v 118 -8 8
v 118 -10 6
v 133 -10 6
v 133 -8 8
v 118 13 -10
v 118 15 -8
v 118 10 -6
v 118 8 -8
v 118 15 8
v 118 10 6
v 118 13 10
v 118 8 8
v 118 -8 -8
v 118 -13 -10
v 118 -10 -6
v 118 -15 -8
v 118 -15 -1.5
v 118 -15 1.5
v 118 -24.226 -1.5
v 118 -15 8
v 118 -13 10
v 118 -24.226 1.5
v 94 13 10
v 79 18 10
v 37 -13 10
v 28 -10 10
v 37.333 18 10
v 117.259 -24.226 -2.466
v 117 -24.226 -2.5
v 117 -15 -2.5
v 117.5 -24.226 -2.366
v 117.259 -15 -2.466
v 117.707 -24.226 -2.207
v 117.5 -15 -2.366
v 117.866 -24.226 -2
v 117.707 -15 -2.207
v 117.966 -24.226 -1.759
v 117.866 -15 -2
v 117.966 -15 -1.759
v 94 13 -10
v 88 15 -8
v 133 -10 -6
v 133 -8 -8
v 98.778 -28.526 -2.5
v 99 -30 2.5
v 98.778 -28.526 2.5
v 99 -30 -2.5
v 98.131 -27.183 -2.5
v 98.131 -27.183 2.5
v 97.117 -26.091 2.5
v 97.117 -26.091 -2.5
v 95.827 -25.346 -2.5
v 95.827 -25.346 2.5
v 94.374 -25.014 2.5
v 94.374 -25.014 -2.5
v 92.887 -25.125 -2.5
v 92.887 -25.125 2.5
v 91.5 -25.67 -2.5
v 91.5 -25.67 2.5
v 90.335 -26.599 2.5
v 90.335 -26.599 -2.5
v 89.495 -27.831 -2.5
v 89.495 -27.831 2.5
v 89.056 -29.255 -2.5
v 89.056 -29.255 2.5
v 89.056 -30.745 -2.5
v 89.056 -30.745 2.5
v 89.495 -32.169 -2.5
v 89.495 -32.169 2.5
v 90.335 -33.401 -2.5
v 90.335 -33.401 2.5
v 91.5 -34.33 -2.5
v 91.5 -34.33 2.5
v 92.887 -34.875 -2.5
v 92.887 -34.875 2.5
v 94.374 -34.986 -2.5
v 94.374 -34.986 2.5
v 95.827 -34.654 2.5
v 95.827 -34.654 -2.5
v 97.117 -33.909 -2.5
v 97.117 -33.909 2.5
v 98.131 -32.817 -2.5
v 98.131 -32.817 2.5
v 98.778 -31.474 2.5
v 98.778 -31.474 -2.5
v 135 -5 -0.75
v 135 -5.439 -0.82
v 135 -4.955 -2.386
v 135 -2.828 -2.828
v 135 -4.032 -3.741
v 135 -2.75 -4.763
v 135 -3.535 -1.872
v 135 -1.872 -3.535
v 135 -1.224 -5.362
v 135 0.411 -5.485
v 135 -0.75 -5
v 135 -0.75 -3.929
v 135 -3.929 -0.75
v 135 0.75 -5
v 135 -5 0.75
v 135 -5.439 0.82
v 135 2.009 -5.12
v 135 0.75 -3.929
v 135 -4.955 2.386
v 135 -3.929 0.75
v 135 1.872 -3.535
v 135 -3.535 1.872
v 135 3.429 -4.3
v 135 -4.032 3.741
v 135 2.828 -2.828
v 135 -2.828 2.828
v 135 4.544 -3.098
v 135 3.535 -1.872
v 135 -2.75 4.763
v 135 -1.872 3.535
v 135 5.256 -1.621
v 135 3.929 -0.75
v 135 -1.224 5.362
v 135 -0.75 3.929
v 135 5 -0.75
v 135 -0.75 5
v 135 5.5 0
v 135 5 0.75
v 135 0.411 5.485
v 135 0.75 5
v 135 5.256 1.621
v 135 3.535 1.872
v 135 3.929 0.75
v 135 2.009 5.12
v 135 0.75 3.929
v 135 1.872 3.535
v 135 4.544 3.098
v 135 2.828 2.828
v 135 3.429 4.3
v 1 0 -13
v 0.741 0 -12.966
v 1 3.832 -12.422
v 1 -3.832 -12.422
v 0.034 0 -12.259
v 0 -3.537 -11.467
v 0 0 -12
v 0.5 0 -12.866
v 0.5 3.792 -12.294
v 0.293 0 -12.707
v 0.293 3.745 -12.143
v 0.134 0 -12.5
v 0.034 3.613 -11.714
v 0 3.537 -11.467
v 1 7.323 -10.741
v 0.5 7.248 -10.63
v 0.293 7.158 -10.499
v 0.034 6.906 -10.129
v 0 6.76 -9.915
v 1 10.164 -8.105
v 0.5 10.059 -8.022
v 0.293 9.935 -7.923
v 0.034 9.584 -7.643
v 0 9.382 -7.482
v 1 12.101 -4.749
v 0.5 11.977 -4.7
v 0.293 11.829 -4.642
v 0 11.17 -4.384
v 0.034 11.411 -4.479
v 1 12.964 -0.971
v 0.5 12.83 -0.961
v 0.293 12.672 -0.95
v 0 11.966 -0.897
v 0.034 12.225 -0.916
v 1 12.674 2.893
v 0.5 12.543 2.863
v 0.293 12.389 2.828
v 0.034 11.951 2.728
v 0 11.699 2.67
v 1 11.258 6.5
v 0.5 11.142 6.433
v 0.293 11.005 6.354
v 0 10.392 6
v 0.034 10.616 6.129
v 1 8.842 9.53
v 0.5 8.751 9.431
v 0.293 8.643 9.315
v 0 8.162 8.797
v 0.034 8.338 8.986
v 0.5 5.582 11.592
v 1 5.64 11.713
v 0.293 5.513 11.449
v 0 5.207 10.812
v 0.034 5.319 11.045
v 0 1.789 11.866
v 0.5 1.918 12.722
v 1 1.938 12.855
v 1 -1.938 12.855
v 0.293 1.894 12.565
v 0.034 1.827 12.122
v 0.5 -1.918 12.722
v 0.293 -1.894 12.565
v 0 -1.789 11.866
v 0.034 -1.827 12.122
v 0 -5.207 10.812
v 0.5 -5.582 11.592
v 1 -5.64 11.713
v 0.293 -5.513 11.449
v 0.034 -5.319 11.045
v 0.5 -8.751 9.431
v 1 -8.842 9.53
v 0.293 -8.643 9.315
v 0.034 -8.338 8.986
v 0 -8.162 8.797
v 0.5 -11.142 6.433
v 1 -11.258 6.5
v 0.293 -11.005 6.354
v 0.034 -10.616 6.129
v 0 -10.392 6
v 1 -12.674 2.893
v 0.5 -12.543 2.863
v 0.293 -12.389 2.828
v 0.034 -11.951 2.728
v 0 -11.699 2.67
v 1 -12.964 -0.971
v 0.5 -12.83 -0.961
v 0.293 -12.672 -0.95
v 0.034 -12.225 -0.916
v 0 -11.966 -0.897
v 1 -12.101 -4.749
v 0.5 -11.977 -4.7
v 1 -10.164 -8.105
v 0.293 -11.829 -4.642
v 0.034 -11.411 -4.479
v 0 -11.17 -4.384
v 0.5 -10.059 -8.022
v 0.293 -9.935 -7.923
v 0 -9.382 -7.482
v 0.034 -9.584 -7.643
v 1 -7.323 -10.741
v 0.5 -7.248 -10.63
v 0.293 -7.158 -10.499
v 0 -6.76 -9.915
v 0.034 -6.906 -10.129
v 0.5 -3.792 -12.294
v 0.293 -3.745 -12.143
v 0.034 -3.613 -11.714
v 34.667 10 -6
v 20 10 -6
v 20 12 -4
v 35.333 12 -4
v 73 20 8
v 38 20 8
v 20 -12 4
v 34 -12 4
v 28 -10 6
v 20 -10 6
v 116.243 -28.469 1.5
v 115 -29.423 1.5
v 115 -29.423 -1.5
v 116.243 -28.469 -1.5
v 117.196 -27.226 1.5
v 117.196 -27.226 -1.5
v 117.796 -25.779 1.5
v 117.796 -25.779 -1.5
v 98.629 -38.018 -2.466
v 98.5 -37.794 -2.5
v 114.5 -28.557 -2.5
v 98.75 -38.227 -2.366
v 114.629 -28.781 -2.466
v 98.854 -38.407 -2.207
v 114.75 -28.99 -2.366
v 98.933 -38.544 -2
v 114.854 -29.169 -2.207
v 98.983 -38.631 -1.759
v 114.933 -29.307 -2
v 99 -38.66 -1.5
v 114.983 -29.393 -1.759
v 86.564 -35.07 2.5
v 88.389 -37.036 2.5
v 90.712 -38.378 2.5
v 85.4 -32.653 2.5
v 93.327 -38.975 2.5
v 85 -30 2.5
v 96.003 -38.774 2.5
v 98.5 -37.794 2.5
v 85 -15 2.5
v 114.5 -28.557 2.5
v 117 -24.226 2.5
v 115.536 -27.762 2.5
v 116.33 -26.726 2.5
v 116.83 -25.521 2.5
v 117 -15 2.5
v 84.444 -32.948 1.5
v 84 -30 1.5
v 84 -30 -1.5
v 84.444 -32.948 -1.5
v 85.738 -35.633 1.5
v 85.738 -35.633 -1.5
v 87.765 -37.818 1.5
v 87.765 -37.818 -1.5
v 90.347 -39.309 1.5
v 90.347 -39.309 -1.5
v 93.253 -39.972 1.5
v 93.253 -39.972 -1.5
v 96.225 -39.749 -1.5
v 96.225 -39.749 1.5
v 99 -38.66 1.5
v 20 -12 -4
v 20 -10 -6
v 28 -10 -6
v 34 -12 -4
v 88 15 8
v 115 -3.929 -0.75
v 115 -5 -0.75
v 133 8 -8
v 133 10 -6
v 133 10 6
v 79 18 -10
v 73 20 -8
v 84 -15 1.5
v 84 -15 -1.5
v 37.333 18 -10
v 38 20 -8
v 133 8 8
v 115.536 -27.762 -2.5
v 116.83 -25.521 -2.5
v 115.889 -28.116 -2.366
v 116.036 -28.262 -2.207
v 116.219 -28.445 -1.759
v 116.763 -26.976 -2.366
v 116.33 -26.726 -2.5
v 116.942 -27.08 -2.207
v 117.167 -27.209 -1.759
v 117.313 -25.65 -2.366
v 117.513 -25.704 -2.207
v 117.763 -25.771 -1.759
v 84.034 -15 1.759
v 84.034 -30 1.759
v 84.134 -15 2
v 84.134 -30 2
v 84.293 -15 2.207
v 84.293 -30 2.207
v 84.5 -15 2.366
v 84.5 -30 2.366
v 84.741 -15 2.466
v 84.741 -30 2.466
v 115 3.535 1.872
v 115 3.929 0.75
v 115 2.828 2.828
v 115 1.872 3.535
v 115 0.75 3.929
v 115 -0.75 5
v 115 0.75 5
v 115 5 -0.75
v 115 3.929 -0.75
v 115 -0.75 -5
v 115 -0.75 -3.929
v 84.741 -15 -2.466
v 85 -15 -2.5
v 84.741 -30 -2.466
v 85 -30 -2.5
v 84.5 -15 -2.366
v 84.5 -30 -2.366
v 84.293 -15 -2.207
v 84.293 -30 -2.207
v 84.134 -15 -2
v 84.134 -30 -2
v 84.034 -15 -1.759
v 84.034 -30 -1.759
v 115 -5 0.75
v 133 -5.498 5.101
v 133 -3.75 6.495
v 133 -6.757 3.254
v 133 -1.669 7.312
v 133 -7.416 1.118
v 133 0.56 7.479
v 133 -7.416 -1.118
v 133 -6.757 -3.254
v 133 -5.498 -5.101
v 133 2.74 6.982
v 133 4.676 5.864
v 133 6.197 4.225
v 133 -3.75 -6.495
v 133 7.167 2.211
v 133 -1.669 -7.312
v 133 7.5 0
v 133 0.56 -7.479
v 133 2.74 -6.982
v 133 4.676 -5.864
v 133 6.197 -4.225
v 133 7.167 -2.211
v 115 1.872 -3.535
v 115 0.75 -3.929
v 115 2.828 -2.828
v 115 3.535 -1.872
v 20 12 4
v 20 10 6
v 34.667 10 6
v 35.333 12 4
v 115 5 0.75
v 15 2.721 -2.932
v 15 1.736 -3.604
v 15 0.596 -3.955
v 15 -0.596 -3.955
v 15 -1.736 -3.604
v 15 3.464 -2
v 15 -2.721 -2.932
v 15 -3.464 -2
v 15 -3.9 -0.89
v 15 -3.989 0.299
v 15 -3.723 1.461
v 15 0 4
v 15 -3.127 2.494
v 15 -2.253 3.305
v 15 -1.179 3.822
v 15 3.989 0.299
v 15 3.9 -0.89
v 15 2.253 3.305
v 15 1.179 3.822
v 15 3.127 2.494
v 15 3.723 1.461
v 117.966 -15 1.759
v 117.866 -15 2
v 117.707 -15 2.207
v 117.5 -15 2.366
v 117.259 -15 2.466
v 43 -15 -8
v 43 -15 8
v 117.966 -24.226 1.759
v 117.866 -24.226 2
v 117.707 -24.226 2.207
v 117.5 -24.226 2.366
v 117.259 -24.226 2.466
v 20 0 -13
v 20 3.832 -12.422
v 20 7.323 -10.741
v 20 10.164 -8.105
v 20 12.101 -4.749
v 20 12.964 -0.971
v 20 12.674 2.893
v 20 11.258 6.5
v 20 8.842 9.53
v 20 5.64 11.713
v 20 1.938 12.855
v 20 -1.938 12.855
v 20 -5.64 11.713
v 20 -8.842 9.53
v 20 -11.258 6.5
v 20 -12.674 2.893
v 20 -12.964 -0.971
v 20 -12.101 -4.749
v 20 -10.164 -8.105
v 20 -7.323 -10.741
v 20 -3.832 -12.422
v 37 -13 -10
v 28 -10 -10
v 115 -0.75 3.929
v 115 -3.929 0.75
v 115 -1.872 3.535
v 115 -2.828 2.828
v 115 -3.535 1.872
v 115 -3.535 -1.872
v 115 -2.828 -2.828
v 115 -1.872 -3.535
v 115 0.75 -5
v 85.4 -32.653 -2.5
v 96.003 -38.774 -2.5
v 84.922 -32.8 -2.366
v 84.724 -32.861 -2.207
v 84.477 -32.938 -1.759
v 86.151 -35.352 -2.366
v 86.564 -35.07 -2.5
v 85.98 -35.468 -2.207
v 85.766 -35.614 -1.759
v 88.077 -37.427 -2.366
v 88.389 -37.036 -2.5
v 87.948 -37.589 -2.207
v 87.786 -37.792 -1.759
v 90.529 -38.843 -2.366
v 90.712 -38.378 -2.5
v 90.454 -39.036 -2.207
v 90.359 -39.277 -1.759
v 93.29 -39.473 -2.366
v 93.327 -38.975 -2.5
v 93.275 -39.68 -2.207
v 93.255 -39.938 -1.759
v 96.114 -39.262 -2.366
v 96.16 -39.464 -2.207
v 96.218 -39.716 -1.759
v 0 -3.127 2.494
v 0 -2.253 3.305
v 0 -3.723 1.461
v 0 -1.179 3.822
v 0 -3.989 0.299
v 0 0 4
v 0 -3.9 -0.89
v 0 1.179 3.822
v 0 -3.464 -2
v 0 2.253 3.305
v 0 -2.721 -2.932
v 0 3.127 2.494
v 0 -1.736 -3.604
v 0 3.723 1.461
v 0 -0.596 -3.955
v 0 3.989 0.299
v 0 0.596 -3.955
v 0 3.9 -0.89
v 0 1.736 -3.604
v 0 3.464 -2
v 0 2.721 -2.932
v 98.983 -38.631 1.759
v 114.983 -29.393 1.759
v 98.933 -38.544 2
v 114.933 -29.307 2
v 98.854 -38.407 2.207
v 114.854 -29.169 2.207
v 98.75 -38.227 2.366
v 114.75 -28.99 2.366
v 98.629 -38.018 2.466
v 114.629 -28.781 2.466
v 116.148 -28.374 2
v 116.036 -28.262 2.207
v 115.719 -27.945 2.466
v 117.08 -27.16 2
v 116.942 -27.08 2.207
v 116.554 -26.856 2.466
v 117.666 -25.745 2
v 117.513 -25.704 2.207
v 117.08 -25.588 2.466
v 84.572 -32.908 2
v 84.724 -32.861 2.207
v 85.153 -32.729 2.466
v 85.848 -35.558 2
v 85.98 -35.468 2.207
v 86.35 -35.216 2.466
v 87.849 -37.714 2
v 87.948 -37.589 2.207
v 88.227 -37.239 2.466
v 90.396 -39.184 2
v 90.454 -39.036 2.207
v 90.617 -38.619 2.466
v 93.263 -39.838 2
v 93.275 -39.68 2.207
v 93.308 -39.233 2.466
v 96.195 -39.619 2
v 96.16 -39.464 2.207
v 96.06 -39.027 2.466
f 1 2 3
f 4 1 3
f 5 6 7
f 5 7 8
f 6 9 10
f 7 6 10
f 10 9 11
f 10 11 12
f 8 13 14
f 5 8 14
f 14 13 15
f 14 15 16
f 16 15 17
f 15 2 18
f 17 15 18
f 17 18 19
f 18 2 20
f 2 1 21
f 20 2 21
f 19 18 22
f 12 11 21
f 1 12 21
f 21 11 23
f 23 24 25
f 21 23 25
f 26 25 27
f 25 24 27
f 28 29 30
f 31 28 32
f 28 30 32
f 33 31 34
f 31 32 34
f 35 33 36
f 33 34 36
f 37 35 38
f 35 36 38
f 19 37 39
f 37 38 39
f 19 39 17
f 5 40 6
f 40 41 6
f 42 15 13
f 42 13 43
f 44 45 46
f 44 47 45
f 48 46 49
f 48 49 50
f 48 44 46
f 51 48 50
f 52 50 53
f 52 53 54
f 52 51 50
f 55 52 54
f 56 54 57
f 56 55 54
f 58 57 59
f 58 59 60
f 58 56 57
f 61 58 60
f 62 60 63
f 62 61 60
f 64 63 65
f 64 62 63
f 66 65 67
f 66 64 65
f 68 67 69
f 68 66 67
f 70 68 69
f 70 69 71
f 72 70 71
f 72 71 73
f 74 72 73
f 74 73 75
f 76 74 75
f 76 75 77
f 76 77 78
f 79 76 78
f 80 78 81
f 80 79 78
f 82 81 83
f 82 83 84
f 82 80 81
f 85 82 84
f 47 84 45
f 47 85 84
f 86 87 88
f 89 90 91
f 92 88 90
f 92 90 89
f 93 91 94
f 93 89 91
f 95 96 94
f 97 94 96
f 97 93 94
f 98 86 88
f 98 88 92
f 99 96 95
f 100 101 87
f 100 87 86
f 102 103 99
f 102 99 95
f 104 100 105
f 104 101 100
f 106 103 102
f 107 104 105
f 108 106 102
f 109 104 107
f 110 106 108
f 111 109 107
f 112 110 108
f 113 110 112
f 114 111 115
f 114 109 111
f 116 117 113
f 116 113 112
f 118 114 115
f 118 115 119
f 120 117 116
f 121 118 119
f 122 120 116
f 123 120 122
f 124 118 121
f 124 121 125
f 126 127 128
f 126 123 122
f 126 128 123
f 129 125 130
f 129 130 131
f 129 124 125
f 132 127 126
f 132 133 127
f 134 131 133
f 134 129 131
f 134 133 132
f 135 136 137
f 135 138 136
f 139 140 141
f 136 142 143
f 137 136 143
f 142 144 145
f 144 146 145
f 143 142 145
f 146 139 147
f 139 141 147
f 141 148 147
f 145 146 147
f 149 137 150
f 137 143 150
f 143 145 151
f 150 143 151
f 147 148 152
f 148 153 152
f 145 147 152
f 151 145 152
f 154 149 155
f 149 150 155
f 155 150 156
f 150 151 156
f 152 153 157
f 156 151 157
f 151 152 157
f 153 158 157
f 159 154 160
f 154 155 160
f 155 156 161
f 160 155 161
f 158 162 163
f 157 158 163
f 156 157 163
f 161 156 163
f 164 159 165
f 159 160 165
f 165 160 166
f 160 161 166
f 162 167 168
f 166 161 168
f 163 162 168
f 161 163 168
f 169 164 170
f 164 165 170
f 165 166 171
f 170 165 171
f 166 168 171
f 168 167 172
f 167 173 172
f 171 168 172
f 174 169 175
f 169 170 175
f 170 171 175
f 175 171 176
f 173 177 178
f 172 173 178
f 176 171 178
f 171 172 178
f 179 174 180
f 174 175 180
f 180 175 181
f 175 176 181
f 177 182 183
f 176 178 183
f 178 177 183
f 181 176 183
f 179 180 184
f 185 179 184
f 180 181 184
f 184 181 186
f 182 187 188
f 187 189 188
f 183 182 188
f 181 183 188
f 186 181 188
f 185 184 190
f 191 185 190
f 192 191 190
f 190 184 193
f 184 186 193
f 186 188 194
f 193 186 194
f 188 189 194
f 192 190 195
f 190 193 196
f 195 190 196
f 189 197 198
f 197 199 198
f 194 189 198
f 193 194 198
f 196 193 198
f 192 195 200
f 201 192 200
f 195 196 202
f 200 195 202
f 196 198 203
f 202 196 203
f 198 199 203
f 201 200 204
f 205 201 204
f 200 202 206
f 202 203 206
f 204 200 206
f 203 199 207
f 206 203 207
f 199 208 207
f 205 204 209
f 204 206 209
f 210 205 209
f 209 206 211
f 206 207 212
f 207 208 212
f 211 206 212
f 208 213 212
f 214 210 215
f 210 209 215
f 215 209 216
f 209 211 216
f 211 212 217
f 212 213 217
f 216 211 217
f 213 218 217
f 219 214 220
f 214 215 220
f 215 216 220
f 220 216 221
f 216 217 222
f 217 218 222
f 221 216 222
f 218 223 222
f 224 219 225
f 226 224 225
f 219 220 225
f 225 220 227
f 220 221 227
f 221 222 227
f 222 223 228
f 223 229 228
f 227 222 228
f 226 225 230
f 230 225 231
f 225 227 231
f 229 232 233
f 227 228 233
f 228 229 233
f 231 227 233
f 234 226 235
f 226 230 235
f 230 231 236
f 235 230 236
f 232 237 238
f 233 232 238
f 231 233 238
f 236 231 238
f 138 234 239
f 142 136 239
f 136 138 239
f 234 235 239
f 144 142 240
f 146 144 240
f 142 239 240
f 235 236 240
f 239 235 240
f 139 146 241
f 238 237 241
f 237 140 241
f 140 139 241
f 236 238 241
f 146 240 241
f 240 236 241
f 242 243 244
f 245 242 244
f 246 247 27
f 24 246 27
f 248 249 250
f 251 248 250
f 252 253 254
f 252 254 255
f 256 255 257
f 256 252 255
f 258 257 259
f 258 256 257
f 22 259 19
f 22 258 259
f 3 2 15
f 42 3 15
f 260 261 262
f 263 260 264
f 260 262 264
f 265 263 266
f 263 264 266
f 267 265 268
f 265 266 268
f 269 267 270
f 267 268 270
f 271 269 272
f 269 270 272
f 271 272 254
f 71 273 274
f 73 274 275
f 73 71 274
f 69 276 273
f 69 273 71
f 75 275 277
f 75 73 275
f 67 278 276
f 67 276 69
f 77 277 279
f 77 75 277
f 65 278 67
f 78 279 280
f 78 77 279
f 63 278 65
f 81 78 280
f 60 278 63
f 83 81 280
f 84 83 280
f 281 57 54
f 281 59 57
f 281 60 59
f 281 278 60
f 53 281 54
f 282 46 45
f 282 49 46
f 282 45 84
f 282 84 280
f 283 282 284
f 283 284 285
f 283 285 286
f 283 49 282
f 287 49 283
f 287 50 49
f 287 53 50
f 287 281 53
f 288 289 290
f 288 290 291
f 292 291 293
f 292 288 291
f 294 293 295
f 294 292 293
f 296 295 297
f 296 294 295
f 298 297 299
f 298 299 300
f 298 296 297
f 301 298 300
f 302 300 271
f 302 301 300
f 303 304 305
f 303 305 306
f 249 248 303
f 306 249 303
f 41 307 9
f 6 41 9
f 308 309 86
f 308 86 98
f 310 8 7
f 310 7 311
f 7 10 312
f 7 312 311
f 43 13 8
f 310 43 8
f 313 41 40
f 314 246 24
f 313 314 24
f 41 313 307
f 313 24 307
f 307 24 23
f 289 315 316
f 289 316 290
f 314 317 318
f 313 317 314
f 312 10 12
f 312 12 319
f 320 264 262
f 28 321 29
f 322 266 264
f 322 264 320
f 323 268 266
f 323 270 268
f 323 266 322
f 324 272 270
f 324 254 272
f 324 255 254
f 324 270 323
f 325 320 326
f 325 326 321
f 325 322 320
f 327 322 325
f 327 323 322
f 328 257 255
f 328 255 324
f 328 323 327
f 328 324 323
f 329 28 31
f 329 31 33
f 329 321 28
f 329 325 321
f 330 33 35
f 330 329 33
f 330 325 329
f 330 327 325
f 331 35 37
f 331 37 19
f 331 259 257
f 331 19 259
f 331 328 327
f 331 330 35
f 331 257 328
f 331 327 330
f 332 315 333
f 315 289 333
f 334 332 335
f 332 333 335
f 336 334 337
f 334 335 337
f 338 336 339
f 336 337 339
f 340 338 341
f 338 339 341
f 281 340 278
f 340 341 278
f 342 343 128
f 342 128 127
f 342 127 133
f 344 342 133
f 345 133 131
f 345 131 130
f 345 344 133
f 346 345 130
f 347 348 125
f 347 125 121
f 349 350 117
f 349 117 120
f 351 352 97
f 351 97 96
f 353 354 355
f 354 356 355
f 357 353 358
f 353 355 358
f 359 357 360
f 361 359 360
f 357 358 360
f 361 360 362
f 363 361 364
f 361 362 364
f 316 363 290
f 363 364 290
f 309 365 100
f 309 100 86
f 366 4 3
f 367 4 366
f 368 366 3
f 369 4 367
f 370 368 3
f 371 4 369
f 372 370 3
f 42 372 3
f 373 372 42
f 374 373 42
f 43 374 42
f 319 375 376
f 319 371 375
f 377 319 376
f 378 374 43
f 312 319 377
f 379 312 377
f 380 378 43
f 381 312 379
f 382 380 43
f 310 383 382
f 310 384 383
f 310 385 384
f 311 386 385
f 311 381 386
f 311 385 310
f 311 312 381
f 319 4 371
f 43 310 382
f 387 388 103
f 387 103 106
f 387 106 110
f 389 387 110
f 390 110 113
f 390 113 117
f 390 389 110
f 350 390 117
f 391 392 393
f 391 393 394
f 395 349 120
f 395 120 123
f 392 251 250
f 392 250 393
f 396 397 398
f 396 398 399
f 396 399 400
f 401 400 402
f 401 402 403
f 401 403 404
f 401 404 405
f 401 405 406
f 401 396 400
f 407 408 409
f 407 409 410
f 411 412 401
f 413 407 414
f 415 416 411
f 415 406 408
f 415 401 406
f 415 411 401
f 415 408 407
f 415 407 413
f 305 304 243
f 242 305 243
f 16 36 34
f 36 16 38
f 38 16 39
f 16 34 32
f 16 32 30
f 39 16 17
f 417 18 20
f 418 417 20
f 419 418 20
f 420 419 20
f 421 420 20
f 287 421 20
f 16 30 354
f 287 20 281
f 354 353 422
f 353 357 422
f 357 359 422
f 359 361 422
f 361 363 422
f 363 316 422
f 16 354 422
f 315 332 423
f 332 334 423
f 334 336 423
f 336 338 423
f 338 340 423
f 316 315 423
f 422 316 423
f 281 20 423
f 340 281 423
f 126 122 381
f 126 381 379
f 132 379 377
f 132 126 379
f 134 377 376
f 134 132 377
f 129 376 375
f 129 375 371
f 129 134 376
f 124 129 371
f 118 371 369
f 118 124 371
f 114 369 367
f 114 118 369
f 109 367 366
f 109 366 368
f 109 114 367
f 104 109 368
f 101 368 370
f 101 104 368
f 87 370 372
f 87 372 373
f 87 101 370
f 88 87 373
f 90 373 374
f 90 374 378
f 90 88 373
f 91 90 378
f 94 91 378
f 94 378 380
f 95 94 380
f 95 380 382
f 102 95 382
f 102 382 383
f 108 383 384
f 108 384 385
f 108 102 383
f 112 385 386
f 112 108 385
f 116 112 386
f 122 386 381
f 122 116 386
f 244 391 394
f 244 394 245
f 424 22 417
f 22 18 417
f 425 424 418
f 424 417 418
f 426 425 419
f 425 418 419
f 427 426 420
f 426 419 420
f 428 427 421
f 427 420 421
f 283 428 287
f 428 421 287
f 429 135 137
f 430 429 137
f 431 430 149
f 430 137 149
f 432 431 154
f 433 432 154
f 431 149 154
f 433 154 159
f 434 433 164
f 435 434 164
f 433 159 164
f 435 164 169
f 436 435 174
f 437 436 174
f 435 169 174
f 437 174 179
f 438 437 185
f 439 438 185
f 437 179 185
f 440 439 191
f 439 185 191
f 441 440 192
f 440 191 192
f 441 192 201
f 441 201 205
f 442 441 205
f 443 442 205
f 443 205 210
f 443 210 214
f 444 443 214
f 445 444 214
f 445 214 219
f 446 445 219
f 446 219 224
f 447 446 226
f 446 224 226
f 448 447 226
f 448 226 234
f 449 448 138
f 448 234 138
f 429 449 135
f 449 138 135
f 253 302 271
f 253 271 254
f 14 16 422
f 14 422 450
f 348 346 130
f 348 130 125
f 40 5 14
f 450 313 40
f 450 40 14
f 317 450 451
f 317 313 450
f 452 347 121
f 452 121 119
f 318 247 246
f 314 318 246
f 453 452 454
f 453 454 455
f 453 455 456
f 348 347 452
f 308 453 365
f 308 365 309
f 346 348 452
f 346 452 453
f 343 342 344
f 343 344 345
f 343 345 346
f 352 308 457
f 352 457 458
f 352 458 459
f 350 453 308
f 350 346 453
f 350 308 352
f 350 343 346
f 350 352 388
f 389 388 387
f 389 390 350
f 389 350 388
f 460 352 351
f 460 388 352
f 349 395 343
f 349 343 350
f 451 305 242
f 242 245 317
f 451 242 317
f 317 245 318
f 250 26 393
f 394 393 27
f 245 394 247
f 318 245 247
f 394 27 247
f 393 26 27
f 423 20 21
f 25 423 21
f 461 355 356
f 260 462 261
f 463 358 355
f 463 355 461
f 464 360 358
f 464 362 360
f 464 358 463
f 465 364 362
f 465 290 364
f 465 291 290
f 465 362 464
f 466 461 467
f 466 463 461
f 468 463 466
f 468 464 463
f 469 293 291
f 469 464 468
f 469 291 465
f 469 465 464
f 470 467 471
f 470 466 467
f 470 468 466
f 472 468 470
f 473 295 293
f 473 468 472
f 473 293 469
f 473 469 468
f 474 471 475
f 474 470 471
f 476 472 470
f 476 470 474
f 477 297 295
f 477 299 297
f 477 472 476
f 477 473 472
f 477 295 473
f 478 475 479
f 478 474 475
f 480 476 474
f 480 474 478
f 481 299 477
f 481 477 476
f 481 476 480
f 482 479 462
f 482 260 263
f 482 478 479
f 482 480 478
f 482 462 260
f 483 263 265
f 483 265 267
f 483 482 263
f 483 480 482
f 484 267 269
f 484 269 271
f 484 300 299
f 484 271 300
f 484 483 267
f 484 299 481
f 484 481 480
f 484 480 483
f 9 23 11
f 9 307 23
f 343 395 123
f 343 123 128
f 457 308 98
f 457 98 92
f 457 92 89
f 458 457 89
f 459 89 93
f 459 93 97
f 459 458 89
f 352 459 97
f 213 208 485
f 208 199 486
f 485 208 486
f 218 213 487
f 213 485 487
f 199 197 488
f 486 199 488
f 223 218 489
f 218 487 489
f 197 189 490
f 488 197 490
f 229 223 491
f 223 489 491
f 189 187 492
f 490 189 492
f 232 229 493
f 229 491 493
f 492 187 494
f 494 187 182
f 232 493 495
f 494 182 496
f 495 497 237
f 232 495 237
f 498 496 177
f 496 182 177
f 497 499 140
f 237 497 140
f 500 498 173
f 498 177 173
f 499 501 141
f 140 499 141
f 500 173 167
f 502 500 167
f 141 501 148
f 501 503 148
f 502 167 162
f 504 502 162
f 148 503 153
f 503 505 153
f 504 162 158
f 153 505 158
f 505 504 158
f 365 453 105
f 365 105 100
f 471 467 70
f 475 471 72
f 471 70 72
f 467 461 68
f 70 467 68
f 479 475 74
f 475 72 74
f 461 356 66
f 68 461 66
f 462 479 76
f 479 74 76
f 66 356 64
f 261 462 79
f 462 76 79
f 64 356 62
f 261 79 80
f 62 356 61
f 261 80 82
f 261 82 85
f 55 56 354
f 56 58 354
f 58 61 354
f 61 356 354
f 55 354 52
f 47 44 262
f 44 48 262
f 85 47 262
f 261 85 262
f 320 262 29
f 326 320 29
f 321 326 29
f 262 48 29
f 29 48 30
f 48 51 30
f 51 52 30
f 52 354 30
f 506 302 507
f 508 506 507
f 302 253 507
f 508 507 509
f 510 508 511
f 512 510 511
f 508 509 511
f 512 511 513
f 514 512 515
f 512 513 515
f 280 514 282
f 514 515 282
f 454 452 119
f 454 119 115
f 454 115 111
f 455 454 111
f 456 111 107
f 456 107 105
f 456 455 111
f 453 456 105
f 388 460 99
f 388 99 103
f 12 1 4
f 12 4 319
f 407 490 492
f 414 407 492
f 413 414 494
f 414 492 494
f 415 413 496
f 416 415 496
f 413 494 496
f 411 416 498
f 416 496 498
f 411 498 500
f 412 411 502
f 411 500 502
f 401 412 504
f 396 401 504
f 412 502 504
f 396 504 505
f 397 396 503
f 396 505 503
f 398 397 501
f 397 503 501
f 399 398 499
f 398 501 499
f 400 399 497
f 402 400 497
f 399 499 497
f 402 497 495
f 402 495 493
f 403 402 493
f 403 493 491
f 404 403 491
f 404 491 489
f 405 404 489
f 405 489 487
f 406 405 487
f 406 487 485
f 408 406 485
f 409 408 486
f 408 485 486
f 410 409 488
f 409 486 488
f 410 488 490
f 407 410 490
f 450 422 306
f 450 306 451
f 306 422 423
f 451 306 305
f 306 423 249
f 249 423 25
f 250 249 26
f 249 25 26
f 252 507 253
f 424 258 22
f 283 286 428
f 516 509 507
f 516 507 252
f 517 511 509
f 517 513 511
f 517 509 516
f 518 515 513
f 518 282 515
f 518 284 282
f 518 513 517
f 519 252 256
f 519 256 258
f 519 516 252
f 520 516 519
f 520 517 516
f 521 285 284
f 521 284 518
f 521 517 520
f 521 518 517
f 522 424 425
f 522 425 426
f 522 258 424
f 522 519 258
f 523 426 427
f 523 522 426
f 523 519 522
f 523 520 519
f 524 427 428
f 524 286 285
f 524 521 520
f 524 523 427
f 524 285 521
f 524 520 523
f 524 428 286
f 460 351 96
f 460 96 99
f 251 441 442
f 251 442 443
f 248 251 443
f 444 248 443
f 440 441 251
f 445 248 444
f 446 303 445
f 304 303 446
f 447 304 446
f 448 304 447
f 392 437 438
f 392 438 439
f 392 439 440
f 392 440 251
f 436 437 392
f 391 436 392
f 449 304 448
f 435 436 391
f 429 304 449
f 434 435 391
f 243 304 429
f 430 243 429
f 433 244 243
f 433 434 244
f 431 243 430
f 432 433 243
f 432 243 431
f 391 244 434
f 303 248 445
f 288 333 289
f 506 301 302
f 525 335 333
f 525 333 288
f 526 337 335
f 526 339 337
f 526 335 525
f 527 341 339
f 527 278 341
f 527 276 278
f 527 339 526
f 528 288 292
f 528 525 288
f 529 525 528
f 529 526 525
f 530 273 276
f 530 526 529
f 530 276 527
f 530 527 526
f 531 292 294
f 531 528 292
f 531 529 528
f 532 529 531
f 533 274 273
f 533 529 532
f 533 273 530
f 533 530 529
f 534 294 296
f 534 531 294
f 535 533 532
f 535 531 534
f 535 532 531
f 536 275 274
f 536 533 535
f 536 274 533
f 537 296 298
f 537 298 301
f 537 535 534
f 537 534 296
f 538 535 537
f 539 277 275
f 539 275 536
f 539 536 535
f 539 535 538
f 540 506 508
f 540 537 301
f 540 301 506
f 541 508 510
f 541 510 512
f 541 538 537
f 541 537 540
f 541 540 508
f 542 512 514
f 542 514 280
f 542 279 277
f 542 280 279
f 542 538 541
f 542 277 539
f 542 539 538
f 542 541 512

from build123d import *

# Parameters (mm, degrees)
SKETCH1_R           = 13
BOSS_EXTRUDE1_DEPTH = 20
SKETCH2_R           = 4
CUT_EXTRUDE1_DEPTH  = 15
SKETCH3_W           = 12
SKETCH3_H           = 24
BOSS_EXTRUDE2_DEPTH = 70
CHAMFER1_SIZE       = 2
BOSS_EXTRUDE3_DEPTH = 10
CHAMFER2_SIZE       = 2
SKETCH5_W           = 16
SKETCH5_H           = 20
BOSS_EXTRUDE4_DEPTH = 15
CHAMFER3_SIZE       = 2
SKETCH6_R           = 7.5
BOSS_EXTRUDE5_DEPTH = 2
CUT_EXTRUDE2_START  = -20
CUT_EXTRUDE2_DEPTH  = 20
CHAMFER4_SIZE       = 2
SKETCH8_R           = 5
BOSS_EXTRUDE6_DEPTH = 2.5
FILLET1_R           = 1
FILLET2_R           = 1


# Some blends are built 0.0001 mm under size
with BuildPart() as part:
    # Sketch1 → Boss-Extrude1 (new body)
    with BuildSketch(Plane(origin=(0, 0, 0), x_dir=(0, 0, -1), z_dir=(1, 0, 0))):
        Circle(SKETCH1_R)
    extrude(amount=BOSS_EXTRUDE1_DEPTH)

    # Sketch2 → Cut-Extrude1 (cut)
    with BuildSketch(Plane.ZY):
        Circle(SKETCH2_R)
    extrude(amount=-CUT_EXTRUDE1_DEPTH, mode=Mode.SUBTRACT)

    # Sketch3 → Boss-Extrude2 (add)
    with BuildSketch(Plane(origin=(20, 0, 0), x_dir=(0, 0, -1), z_dir=(1, 0, 0))):
        Rectangle(SKETCH3_W, SKETCH3_H)
    extrude(amount=BOSS_EXTRUDE2_DEPTH)

    # Chamfer1
    # the kernel refuses this chamfer: 2 mm, written as the material it takes off along each edge
    with BuildSketch(Plane(origin=(20, -12, -6), x_dir=(0, 0.9996219169112968, -0.027495876610586487), z_dir=(1, 0, 0)), Plane(origin=(20, 12, 6), x_dir=(0, -0.9996219169112968, 0.027495876610586487), z_dir=(1, 0, 0)), Plane(origin=(20, -12, 6), x_dir=(0, -0.027495876610586494, -0.9996219169112968), z_dir=(1, 0, 0))) as chamfer1_piece_1:
        Polygon((CHAMFER1_SIZE * 0.999621916911, CHAMFER1_SIZE * 0.0274958766106), (-CHAMFER1_SIZE * 0.0274958766106, CHAMFER1_SIZE * 0.999621916911), (0, 0), align=None)
    extrude(amount=75.143365976, mode=Mode.SUBTRACT)
    with BuildSketch(Plane(origin=(20, 12, -6), x_dir=(0, -0.9996219169112968, -0.027495876610586487), z_dir=(1, 0, 0))) as chamfer1_piece_2:
        Polygon((CHAMFER1_SIZE * 0.999621916911, -CHAMFER1_SIZE * 0.0274958766106), (-CHAMFER1_SIZE * 0.0274958766106, -CHAMFER1_SIZE * 0.999621916911), (0, 0), align=None)
    extrude(amount=75.143365976, mode=Mode.SUBTRACT)

    # Sketch4 → Boss-Extrude3 (add, symmetric)
    with BuildSketch(Plane.XY):
        Polygon((28, -10), (38, 20), (73, 20), (88, 15), (118, 15), (118, -15), (43, -15), align=None)
    extrude(amount=BOSS_EXTRUDE3_DEPTH, both=True)

    # Chamfer2
    chamfer2_edges = [part.edges().sort_by_distance(p)[0] for p in [
        (80.5, -15, -10),
        (103, 15, -10),
        (55.5, 20, -10),
        (80.5, -15, 10),
        (103, 15, 10),
        (55.5, 20, 10),
    ]]
    chamfer(chamfer2_edges, length=CHAMFER2_SIZE)

    # Sketch5 → Boss-Extrude4 (add)
    with BuildSketch(Plane(origin=(118, 0, 0), x_dir=(0, 0, -1), z_dir=(1, 0, 0))):
        Rectangle(SKETCH5_W, SKETCH5_H)
    extrude(amount=BOSS_EXTRUDE4_DEPTH)

    # Chamfer3
    chamfer3_edges = [part.edges().sort_by_distance(p)[0] for p in [
        (125.5, -10, -8),
        (125.5, 10, -8),
        (125.5, 10, 8),
        (125.5, -10, 8),
    ]]
    chamfer(chamfer3_edges, length=CHAMFER3_SIZE)

    # Sketch6 → Boss-Extrude5 (add)
    with BuildSketch(Plane(origin=(133, 0, 0), x_dir=(0, 0, -1), z_dir=(1, 0, 0))):
        with Locations(Location((0, 0, 0), (0, 0, 90))):
            Circle(SKETCH6_R)
    extrude(amount=BOSS_EXTRUDE5_DEPTH)

    # Sketch7 → Cut-Extrude2 (cut)
    with BuildSketch(Plane(origin=(135, 0, 0), x_dir=(0, 0, -1), z_dir=(1, 0, 0)).offset(CUT_EXTRUDE2_START)):
        with BuildLine():
            Line((5, -0.75), (5, 0.75))
            Line((5, 0.75), (3.929058411, 0.75))
            ThreePointArc((3.929058411, 0.75), (2.828427125, 2.828427125), (0.75, 3.929058411))
            Line((0.75, 3.929058411), (0.75, 5))
            Line((0.75, 5), (-0.75, 5))
            Line((-0.75, 5), (-0.75, 3.929058411))
            ThreePointArc((-0.75, 3.929058411), (-2.828427125, 2.828427125), (-3.929058411, 0.75))
            Line((-3.929058411, 0.75), (-5, 0.75))
            Line((-5, 0.75), (-5, -0.75))
            Line((-5, -0.75), (-3.929058411, -0.75))
            ThreePointArc((-3.929058411, -0.75), (-2.828427125, -2.828427125), (-0.75, -3.929058411))
            Line((-0.75, -3.929058411), (-0.75, -5))
            Line((-0.75, -5), (0.75, -5))
            Line((0.75, -5), (0.75, -3.929058411))
            ThreePointArc((0.75, -3.929058411), (2.828427125, -2.828427125), (3.929058411, -0.75))
            Line((3.929058411, -0.75), (5, -0.75))
        make_face()
    extrude(amount=CUT_EXTRUDE2_DEPTH, mode=Mode.SUBTRACT)

    # Chamfer4
    chamfer4_edges = [part.edges().sort_by_distance(p)[0] for p in [
        (135, -7.5, 0),
    ]]
    chamfer(chamfer4_edges, length=CHAMFER4_SIZE - 0.0001)  # a hair under: the kernel refuses the full size

    # Sketch8 → Boss-Extrude6 (add, symmetric)
    with BuildSketch(Plane.XY):
        with BuildLine():
            Line((118, -15), (84, -15))
            Line((84, -15), (84, -30))
            ThreePointArc((84, -30), (89, -38.660254038), (99, -38.660254038))
            Line((99, -38.660254038), (115, -29.422649731))
            ThreePointArc((115, -29.422649731), (117.196152423, -27.226497308), (118, -24.226497308))
            Line((118, -24.226497308), (118, -15))
        make_face()
        with Locations((94, -30)):
            Circle(SKETCH8_R, mode=Mode.SUBTRACT)
    extrude(amount=BOSS_EXTRUDE6_DEPTH, both=True)

    # Fillet1
    fillet1_edges = [part.edges().sort_by_distance(p)[0] for p in [
        (0, 0, 13),
    ]]
    fillet(fillet1_edges, radius=FILLET1_R)

    # Fillet2
    fillet2_edges = [part.edges().sort_by_distance(p)[0] for p in [
        (107, -34.041451884, -2.5),
        (117.196152423, -27.226497308, -2.5),
        (118, -19.613248654, 2.5),
        (84, -22.5, -2.5),
        (89, -38.660254038, -2.5),
        (107, -34.041451884, 2.5),
        (117.196152423, -27.226497308, 2.5),
        (84, -22.5, 2.5),
        (89, -38.660254038, 2.5),
        (118, -19.613248654, -2.5),
    ]]
    fillet(fillet2_edges, radius=FILLET2_R)


solid = part.part
